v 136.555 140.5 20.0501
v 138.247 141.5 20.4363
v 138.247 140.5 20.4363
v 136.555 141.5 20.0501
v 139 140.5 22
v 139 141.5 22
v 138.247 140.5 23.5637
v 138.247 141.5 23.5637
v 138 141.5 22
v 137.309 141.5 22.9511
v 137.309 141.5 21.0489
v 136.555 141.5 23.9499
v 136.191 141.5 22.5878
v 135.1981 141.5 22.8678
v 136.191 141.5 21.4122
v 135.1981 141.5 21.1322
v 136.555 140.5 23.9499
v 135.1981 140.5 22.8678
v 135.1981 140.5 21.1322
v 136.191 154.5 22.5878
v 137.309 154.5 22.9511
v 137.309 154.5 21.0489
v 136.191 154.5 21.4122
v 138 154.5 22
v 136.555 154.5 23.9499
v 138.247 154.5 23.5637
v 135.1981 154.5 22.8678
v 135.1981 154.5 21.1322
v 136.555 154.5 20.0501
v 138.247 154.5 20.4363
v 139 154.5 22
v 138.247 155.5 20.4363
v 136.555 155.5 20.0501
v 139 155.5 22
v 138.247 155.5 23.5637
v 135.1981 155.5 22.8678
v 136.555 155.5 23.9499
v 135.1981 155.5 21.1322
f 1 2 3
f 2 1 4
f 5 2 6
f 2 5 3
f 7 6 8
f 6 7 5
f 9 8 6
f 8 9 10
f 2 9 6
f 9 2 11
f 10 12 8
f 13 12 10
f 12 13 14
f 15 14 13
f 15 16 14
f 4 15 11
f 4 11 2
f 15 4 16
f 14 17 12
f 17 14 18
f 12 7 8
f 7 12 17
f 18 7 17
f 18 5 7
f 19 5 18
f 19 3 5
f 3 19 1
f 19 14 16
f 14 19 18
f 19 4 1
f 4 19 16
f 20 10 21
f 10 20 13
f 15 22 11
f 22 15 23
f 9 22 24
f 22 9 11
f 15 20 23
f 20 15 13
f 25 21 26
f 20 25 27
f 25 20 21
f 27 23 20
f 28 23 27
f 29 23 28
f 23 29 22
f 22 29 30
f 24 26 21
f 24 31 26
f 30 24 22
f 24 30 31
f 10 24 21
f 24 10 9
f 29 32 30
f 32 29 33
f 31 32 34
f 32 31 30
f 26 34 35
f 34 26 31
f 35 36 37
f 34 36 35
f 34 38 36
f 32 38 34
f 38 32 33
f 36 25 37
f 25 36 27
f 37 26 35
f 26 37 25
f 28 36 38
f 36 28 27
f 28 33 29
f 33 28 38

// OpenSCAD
// Generated from the same CSG operations as STEP. Rebuild with spec/build_parent_hand_service.py.
translate([137,140.5,22]) rotate([-90,0,0]) union(){cylinder(r=2,h=1);translate([0,0,1]) cylinder(r=1,h=13);translate([0,0,14]) cylinder(r=2,h=1);}
